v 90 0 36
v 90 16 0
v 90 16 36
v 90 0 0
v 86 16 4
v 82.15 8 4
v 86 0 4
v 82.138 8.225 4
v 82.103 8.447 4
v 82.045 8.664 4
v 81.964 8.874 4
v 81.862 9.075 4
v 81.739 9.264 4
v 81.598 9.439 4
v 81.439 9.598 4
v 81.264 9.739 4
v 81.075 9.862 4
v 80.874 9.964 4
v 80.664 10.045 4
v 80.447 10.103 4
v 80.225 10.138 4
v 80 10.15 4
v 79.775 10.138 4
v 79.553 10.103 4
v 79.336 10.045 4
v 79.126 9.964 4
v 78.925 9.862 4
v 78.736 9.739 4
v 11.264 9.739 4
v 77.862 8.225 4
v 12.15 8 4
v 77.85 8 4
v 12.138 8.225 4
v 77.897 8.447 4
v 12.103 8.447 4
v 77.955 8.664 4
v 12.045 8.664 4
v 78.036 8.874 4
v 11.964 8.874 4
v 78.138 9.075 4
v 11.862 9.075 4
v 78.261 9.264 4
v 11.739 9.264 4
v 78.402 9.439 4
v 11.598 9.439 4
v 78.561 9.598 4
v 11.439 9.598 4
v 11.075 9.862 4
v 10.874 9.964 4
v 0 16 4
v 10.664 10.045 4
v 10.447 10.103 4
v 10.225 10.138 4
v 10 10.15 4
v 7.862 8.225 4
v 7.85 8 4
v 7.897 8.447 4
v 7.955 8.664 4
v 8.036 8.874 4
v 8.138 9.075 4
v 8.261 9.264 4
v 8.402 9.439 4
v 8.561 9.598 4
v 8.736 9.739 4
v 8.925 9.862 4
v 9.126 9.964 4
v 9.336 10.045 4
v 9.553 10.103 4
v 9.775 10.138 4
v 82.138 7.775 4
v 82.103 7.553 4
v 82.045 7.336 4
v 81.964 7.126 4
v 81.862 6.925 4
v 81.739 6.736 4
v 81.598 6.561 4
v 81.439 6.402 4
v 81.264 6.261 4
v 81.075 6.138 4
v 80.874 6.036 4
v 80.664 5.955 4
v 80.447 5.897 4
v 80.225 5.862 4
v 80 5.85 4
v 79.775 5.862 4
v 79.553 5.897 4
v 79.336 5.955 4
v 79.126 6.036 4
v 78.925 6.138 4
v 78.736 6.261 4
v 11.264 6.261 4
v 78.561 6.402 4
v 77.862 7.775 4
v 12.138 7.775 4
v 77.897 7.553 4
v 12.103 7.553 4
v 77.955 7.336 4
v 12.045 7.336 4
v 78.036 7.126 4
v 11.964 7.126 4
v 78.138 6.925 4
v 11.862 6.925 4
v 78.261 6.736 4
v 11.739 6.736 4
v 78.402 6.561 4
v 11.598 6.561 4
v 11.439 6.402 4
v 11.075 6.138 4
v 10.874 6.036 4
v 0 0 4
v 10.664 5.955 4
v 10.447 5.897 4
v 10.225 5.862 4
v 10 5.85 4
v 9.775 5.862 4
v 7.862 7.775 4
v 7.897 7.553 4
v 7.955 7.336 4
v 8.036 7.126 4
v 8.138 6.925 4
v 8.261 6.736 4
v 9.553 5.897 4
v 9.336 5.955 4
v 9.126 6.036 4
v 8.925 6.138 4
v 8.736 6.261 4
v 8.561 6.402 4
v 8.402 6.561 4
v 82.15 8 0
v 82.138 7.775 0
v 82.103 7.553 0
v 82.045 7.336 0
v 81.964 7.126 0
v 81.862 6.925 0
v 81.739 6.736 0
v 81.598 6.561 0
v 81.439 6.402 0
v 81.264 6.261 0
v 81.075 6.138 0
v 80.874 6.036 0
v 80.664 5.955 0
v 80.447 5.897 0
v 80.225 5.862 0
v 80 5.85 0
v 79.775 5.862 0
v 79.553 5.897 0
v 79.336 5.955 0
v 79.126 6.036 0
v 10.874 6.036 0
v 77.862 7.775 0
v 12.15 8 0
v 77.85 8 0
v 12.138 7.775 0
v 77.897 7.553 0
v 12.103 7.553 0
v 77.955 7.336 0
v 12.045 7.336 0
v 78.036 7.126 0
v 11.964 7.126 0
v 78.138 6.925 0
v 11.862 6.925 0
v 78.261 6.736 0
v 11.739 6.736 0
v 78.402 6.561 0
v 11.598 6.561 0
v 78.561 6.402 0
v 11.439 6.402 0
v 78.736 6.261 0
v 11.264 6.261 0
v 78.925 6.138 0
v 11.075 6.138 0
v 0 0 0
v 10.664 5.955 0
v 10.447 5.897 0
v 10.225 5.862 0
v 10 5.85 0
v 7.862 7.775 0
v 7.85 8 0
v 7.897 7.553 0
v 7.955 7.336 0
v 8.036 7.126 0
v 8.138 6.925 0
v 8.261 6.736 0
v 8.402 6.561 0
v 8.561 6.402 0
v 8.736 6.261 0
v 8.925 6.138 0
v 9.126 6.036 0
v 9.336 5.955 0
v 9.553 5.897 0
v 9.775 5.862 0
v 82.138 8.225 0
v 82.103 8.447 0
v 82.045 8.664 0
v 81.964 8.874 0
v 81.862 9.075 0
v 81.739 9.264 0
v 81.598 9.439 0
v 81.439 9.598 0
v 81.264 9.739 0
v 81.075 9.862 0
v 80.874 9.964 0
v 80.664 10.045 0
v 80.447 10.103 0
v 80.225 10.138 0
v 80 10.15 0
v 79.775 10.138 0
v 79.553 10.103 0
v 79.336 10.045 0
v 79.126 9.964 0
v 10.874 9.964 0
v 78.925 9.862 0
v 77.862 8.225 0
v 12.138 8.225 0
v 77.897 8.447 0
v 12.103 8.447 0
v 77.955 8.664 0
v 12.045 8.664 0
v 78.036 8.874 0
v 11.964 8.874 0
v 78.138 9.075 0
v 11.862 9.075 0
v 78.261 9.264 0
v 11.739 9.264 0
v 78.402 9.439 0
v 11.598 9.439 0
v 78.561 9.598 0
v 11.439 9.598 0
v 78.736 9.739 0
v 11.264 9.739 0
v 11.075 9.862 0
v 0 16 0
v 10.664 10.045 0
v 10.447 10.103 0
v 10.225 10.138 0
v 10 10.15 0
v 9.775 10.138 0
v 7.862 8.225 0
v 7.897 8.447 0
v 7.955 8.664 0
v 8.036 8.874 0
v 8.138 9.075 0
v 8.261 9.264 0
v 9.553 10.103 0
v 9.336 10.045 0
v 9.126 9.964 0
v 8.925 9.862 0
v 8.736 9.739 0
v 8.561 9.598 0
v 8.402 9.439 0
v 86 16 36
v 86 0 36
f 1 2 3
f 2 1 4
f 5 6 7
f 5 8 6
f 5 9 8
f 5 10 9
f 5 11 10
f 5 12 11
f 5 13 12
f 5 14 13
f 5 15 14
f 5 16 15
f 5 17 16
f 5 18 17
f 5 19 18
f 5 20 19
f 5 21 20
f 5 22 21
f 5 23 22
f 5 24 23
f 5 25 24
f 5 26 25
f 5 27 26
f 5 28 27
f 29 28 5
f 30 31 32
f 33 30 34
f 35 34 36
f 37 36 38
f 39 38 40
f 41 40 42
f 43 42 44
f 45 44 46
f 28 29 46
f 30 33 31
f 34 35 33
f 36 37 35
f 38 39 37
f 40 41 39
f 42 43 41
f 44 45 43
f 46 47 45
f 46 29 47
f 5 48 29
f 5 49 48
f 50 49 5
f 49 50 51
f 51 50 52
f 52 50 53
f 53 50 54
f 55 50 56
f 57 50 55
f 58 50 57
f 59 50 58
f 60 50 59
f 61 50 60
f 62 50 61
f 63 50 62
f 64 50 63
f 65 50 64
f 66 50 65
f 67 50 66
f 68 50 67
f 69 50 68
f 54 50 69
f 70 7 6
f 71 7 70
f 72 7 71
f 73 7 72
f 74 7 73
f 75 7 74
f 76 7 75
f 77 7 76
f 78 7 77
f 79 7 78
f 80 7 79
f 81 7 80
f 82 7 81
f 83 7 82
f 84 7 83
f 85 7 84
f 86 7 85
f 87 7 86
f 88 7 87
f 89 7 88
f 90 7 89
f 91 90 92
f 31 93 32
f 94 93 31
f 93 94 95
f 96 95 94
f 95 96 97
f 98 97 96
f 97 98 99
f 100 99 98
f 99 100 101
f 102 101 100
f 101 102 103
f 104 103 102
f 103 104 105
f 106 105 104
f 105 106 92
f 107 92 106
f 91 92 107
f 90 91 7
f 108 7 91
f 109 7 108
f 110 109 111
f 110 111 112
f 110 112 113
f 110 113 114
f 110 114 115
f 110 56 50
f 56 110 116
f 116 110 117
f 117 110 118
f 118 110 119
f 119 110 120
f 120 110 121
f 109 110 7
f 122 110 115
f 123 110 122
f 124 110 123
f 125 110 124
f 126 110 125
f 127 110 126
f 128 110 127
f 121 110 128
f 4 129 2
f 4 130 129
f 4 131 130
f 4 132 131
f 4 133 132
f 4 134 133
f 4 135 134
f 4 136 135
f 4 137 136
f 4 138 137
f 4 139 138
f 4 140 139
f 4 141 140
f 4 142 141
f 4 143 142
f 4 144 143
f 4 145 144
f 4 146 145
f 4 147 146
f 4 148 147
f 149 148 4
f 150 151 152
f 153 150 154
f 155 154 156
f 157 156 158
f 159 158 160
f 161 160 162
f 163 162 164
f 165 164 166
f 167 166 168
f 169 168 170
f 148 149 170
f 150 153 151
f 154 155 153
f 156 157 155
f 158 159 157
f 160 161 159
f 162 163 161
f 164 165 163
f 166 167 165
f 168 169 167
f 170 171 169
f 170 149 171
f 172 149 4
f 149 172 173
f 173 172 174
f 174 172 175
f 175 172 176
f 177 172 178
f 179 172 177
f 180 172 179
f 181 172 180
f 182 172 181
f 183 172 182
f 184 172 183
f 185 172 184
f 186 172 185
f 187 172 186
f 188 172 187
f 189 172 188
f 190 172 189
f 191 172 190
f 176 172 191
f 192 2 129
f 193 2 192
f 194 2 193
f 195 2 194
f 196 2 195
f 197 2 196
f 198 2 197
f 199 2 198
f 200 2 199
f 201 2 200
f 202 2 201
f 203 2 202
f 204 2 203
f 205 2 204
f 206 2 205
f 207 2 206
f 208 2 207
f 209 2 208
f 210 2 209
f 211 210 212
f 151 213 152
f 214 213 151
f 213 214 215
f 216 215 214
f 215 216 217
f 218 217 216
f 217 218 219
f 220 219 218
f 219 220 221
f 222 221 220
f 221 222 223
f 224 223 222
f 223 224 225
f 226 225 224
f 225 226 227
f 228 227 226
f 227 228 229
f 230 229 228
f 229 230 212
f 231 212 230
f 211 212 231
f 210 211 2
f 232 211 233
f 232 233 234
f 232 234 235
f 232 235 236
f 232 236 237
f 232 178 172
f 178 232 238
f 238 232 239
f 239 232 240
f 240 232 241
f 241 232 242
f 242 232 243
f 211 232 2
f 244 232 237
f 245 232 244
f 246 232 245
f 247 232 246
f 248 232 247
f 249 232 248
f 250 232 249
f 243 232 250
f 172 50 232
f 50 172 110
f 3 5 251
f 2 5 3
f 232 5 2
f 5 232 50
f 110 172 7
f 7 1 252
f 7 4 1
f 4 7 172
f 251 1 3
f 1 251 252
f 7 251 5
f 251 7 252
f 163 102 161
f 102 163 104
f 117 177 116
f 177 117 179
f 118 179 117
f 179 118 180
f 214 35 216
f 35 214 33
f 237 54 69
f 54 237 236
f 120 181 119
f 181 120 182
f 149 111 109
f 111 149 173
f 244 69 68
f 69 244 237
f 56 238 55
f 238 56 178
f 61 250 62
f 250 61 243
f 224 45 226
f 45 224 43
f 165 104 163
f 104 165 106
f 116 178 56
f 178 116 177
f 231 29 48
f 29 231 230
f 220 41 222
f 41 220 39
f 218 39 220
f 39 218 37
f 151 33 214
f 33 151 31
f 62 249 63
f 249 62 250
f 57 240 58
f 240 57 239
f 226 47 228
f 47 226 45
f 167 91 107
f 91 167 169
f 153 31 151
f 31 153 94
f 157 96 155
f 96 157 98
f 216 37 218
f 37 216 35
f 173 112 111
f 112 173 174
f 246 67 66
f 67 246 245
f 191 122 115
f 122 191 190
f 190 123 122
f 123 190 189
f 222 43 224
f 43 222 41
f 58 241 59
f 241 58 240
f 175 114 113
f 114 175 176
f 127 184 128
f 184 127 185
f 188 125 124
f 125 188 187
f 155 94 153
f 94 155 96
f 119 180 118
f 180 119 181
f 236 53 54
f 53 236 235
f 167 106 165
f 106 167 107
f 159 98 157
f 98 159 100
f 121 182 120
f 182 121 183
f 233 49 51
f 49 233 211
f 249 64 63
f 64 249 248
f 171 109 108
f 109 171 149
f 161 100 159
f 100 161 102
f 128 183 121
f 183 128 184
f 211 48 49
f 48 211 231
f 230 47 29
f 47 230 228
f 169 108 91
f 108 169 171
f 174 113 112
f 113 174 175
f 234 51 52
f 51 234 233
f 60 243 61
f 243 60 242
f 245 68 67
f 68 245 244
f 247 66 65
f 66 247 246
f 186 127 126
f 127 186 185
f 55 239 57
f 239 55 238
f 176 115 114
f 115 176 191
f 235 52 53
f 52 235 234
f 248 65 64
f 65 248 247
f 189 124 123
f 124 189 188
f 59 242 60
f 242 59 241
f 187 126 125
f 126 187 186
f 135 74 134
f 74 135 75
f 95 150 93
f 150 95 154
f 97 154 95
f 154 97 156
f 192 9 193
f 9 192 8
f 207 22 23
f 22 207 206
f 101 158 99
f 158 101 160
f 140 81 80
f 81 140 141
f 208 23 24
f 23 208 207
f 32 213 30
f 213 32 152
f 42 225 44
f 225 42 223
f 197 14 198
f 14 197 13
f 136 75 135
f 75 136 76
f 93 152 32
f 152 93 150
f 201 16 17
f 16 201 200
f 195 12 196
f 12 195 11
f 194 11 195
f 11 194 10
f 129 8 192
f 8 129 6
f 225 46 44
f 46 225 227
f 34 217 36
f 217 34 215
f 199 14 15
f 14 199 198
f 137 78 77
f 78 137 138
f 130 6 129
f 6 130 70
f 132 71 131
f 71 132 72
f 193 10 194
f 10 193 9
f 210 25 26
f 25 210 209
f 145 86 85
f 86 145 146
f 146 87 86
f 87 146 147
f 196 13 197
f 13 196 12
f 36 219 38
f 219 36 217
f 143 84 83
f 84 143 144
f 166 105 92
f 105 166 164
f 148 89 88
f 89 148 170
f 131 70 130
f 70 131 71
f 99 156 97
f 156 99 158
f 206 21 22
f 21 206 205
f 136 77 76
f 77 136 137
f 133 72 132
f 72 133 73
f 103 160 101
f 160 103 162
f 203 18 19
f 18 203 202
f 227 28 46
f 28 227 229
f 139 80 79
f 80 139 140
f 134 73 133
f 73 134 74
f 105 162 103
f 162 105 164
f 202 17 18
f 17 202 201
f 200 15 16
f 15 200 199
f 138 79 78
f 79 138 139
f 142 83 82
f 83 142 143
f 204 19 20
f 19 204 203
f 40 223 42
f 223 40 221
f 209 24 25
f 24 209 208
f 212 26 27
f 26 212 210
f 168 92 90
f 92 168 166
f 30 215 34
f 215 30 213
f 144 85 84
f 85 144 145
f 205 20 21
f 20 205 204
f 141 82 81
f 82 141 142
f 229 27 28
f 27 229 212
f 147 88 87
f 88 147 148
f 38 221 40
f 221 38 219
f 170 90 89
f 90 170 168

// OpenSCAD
// Latch hook bracket.
$fn = 60;
eps = 0.02;
length = 90;
height = 32;
width = 16;
thickness = 4;
difference() { union() { cube([length,width,thickness]); translate([length-thickness,0,thickness]) cube([thickness,width,height]); } for(x=[10,length-10]) translate([x,width/2,-eps]) cylinder(d=4.3,h=thickness+2*eps); }
